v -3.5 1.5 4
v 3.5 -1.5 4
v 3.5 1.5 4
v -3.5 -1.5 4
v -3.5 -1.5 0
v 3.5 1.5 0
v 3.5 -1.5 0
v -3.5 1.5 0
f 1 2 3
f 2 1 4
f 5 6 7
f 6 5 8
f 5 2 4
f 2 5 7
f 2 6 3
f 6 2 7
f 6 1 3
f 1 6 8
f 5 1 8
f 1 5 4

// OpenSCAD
$fa=0.5; // default minimum facet angle is now 0.5
$fs=0.5; // default minimum facet size is now 0.5 mm
// A comment
// Cube Dimensions
xLength = 7;
yLength = 3;
zLength = 4;
cubeVector = [xLength, yLength, zLength];
centerTorF = true;

// Displacement Values
xDisplacement = 0;
yDisplacement = 0;
// zDisplacement = 0;
zDisplacement = zLength/2;
displacementVector = [xDisplacement, yDisplacement, zDisplacement];

red = [1,0,0];
green = [0,1,0];
blue = [0,0,1];


translate(displacementVector) {
        color(blue)
        cube(cubeVector, center=centerTorF);
}

// cylinder(h=5,r=2, r2=0, center=true);
